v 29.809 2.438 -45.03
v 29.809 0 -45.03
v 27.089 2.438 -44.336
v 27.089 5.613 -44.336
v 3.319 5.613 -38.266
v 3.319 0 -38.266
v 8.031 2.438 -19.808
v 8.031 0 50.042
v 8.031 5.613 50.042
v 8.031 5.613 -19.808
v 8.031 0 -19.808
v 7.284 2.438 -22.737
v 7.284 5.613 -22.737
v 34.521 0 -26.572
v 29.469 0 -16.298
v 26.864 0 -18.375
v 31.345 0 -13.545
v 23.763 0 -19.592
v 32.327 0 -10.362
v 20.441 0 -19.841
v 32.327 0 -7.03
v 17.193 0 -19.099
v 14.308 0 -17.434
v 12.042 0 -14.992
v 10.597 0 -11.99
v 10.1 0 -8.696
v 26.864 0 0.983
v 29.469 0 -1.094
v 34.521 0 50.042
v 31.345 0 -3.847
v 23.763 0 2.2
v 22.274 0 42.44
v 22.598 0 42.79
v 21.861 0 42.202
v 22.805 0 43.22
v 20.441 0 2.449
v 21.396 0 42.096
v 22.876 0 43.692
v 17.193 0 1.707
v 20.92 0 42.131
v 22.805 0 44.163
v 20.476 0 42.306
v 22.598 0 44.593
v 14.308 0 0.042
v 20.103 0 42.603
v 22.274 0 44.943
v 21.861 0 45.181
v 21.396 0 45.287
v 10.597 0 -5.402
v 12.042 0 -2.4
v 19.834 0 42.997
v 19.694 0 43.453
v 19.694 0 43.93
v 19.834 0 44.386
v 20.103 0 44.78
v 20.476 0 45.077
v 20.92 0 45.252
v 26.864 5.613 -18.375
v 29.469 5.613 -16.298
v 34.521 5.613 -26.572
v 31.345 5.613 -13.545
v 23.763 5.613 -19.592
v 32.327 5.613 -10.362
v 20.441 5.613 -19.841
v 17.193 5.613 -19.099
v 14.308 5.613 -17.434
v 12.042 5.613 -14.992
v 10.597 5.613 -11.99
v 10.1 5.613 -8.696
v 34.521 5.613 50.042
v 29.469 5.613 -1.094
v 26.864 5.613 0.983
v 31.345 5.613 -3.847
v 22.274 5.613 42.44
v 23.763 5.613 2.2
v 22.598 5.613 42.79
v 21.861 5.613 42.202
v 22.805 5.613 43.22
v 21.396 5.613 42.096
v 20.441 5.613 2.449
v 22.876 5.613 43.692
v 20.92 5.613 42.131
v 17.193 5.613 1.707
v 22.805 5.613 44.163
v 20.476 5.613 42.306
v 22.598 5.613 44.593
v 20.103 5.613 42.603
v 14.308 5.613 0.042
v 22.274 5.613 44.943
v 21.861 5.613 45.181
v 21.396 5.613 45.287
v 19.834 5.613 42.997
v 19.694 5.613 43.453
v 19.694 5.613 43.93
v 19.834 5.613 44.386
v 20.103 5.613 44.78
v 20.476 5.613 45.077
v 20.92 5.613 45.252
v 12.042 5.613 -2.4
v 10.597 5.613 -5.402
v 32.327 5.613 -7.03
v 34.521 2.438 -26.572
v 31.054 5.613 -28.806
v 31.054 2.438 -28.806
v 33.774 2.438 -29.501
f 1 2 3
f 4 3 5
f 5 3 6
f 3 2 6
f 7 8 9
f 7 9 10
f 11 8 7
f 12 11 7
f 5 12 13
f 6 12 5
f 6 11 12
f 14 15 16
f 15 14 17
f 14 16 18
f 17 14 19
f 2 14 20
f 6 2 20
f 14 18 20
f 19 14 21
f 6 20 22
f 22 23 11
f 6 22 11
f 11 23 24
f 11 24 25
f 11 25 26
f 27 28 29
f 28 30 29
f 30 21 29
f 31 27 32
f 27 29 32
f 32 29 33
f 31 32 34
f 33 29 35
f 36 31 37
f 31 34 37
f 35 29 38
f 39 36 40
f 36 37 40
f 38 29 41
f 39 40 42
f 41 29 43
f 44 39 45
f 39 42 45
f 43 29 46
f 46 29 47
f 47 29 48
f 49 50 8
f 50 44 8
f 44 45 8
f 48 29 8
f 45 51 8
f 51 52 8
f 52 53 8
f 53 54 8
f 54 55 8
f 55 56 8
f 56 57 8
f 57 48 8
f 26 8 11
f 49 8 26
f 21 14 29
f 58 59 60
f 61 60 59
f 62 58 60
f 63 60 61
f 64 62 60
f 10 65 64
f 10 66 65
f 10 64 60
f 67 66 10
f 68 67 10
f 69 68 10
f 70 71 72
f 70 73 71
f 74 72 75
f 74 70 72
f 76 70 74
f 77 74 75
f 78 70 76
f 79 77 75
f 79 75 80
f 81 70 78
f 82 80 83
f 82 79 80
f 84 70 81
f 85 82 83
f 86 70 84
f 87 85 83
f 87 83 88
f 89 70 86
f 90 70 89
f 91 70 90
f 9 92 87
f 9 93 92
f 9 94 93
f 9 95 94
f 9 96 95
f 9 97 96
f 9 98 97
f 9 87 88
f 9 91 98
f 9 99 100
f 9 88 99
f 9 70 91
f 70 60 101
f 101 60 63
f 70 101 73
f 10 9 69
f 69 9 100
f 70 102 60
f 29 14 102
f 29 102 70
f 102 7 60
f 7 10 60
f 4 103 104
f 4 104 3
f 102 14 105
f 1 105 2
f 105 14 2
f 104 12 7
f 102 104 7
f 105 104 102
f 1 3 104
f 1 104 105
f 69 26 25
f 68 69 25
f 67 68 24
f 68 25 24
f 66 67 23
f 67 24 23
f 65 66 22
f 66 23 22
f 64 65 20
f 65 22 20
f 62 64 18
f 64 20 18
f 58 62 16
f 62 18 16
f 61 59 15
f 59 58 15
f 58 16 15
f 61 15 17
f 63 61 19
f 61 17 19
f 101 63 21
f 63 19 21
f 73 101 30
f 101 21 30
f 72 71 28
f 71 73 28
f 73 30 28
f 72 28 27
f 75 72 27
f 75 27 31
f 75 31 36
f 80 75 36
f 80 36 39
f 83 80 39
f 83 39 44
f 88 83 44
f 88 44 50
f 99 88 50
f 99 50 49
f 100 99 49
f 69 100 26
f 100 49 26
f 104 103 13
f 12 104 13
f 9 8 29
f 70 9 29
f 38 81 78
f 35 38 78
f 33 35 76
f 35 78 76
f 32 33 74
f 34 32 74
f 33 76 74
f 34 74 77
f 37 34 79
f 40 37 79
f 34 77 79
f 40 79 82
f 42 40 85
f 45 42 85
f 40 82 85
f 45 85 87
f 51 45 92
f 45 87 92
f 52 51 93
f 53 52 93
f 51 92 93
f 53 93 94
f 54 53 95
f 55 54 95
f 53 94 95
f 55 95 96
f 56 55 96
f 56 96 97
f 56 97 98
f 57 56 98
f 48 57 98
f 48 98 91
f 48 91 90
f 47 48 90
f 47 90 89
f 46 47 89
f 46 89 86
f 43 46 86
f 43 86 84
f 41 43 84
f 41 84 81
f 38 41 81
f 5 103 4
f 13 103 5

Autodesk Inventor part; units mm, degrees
ref_plane "YZ Plane" through (0, 0, 0) normal (1, 0, 0) x (0, 1, 0)
ref_plane "XZ Plane" through (0, 0, 0) normal (0, 1, 0) x (-1, 0, 0)
ref_plane "XY Plane" through (0, 0, 0) normal (0, 0, 1) x (1, 0, 0)
sketch "Sketch1" plane through (0, 0, 0) normal (0, 1, 0) x (-1, 0, 0)
  line L0 (18.6455, 5.0782) -> (18.6456, 5.0782)
  line L1 (-34.5212, -26.5719) -> (-29.8086, -45.0298)
  line L2 (-29.8086, -45.0298) -> (-3.3186, -38.2664)
  circle A0 centre (-21.2762, -8.696) radius 11.176
  line L3 (-8.0312, 50.0415) -> (-8.0312, -19.8085)
  line L4 (-8.0312, -19.8085) -> (-3.3186, -38.2664)
  line L5 (-3.3186, -38.2664) -> (-29.8086, -45.0298)
  line L6 (-29.8086, -45.0298) -> (-34.5212, -26.5719)
  line L7 (-34.5212, -26.5719) -> (-34.5212, 50.0415)
  line L8 (-8.0312, 50.0415) -> (-34.5212, 50.0415)
  point P0 (0, 0)
  dimension "d4" = 22.352
  dimension "d24" = 19.05
  dimension "d25" = 69.85
  dimension "d26" = 19.05
  dimension "d28" = 26.49
  dimension "d29" = 13.245
  dimension "d35" = 58.7375
  dimension "d36" = 75.677
extrude "Extrusion1" add sketch "Sketch1" along normal blind 5.6134
sketch "Sketch2" plane through (0, 5.6134, 0) normal (0, 1, 0) x (1, 0, 0)
  line L0 (34.5212, 26.5719) -> (29.8086, 45.0298) projected
  line L1 (8.0312, 19.8085) -> (34.5212, 26.5719)
  line L2 (34.5212, 26.5719) -> (33.7735, 29.5006)
  line L3 (33.7735, 29.5006) -> (7.2835, 22.7372)
  line L4 (7.2835, 22.7372) -> (8.0312, 19.8085)
  point P0 (0, 0)
  point P1 (0, 0)
  dimension "d37" = 3.0226
extrude "Extrusion2" cut sketch "Sketch2" against normal blind 3.175
sketch "Sketch3" plane through (0, 5.6134, 0) normal (0, 1, 0) x (1, 0, 0)
  line L0 (33.7735, 29.5006) -> (29.8086, 45.0298) projected
  line L1 (29.8086, 45.0298) -> (3.3186, 38.2664) projected
  line L2 (29.8086, 45.0298) -> (34.5212, 26.5719) projected
  line L3 (29.8086, 45.0298) -> (34.5212, 26.5719)
  line L4 (34.5212, 26.5719) -> (31.8018, 25.8776)
  line L5 (31.8018, 25.8776) -> (27.0891, 44.3355)
  line L6 (27.0891, 44.3355) -> (29.8086, 45.0298)
  point P0 (0, 0)
  point P1 (27.0891, 44.3355)
  dimension "d38" = 2.8067
extrude "Extrusion3" cut sketch "Sketch3" against normal blind 3.175
sketch "Sketch4" plane through (0, 5.6134, 0) normal (0, 1, 0) x (1, 0, 0)
  line L0 (8.0312, -50.0415) -> (34.5212, -50.0415) projected
  line L1 (34.5212, -50.0415) -> (34.5212, 26.5719) projected
  circle A0 centre (21.2762, -43.6915) radius 1.6002
  point P0 (0, 0)
  dimension "d30" = 3.2004
  dimension "d31" = 13.245
  dimension "d32" = 6.35
extrude "Extrusion4" cut sketch "Sketch4" against normal blind 25.4
properties part number "Lidar Sensor Case Piece 2"
